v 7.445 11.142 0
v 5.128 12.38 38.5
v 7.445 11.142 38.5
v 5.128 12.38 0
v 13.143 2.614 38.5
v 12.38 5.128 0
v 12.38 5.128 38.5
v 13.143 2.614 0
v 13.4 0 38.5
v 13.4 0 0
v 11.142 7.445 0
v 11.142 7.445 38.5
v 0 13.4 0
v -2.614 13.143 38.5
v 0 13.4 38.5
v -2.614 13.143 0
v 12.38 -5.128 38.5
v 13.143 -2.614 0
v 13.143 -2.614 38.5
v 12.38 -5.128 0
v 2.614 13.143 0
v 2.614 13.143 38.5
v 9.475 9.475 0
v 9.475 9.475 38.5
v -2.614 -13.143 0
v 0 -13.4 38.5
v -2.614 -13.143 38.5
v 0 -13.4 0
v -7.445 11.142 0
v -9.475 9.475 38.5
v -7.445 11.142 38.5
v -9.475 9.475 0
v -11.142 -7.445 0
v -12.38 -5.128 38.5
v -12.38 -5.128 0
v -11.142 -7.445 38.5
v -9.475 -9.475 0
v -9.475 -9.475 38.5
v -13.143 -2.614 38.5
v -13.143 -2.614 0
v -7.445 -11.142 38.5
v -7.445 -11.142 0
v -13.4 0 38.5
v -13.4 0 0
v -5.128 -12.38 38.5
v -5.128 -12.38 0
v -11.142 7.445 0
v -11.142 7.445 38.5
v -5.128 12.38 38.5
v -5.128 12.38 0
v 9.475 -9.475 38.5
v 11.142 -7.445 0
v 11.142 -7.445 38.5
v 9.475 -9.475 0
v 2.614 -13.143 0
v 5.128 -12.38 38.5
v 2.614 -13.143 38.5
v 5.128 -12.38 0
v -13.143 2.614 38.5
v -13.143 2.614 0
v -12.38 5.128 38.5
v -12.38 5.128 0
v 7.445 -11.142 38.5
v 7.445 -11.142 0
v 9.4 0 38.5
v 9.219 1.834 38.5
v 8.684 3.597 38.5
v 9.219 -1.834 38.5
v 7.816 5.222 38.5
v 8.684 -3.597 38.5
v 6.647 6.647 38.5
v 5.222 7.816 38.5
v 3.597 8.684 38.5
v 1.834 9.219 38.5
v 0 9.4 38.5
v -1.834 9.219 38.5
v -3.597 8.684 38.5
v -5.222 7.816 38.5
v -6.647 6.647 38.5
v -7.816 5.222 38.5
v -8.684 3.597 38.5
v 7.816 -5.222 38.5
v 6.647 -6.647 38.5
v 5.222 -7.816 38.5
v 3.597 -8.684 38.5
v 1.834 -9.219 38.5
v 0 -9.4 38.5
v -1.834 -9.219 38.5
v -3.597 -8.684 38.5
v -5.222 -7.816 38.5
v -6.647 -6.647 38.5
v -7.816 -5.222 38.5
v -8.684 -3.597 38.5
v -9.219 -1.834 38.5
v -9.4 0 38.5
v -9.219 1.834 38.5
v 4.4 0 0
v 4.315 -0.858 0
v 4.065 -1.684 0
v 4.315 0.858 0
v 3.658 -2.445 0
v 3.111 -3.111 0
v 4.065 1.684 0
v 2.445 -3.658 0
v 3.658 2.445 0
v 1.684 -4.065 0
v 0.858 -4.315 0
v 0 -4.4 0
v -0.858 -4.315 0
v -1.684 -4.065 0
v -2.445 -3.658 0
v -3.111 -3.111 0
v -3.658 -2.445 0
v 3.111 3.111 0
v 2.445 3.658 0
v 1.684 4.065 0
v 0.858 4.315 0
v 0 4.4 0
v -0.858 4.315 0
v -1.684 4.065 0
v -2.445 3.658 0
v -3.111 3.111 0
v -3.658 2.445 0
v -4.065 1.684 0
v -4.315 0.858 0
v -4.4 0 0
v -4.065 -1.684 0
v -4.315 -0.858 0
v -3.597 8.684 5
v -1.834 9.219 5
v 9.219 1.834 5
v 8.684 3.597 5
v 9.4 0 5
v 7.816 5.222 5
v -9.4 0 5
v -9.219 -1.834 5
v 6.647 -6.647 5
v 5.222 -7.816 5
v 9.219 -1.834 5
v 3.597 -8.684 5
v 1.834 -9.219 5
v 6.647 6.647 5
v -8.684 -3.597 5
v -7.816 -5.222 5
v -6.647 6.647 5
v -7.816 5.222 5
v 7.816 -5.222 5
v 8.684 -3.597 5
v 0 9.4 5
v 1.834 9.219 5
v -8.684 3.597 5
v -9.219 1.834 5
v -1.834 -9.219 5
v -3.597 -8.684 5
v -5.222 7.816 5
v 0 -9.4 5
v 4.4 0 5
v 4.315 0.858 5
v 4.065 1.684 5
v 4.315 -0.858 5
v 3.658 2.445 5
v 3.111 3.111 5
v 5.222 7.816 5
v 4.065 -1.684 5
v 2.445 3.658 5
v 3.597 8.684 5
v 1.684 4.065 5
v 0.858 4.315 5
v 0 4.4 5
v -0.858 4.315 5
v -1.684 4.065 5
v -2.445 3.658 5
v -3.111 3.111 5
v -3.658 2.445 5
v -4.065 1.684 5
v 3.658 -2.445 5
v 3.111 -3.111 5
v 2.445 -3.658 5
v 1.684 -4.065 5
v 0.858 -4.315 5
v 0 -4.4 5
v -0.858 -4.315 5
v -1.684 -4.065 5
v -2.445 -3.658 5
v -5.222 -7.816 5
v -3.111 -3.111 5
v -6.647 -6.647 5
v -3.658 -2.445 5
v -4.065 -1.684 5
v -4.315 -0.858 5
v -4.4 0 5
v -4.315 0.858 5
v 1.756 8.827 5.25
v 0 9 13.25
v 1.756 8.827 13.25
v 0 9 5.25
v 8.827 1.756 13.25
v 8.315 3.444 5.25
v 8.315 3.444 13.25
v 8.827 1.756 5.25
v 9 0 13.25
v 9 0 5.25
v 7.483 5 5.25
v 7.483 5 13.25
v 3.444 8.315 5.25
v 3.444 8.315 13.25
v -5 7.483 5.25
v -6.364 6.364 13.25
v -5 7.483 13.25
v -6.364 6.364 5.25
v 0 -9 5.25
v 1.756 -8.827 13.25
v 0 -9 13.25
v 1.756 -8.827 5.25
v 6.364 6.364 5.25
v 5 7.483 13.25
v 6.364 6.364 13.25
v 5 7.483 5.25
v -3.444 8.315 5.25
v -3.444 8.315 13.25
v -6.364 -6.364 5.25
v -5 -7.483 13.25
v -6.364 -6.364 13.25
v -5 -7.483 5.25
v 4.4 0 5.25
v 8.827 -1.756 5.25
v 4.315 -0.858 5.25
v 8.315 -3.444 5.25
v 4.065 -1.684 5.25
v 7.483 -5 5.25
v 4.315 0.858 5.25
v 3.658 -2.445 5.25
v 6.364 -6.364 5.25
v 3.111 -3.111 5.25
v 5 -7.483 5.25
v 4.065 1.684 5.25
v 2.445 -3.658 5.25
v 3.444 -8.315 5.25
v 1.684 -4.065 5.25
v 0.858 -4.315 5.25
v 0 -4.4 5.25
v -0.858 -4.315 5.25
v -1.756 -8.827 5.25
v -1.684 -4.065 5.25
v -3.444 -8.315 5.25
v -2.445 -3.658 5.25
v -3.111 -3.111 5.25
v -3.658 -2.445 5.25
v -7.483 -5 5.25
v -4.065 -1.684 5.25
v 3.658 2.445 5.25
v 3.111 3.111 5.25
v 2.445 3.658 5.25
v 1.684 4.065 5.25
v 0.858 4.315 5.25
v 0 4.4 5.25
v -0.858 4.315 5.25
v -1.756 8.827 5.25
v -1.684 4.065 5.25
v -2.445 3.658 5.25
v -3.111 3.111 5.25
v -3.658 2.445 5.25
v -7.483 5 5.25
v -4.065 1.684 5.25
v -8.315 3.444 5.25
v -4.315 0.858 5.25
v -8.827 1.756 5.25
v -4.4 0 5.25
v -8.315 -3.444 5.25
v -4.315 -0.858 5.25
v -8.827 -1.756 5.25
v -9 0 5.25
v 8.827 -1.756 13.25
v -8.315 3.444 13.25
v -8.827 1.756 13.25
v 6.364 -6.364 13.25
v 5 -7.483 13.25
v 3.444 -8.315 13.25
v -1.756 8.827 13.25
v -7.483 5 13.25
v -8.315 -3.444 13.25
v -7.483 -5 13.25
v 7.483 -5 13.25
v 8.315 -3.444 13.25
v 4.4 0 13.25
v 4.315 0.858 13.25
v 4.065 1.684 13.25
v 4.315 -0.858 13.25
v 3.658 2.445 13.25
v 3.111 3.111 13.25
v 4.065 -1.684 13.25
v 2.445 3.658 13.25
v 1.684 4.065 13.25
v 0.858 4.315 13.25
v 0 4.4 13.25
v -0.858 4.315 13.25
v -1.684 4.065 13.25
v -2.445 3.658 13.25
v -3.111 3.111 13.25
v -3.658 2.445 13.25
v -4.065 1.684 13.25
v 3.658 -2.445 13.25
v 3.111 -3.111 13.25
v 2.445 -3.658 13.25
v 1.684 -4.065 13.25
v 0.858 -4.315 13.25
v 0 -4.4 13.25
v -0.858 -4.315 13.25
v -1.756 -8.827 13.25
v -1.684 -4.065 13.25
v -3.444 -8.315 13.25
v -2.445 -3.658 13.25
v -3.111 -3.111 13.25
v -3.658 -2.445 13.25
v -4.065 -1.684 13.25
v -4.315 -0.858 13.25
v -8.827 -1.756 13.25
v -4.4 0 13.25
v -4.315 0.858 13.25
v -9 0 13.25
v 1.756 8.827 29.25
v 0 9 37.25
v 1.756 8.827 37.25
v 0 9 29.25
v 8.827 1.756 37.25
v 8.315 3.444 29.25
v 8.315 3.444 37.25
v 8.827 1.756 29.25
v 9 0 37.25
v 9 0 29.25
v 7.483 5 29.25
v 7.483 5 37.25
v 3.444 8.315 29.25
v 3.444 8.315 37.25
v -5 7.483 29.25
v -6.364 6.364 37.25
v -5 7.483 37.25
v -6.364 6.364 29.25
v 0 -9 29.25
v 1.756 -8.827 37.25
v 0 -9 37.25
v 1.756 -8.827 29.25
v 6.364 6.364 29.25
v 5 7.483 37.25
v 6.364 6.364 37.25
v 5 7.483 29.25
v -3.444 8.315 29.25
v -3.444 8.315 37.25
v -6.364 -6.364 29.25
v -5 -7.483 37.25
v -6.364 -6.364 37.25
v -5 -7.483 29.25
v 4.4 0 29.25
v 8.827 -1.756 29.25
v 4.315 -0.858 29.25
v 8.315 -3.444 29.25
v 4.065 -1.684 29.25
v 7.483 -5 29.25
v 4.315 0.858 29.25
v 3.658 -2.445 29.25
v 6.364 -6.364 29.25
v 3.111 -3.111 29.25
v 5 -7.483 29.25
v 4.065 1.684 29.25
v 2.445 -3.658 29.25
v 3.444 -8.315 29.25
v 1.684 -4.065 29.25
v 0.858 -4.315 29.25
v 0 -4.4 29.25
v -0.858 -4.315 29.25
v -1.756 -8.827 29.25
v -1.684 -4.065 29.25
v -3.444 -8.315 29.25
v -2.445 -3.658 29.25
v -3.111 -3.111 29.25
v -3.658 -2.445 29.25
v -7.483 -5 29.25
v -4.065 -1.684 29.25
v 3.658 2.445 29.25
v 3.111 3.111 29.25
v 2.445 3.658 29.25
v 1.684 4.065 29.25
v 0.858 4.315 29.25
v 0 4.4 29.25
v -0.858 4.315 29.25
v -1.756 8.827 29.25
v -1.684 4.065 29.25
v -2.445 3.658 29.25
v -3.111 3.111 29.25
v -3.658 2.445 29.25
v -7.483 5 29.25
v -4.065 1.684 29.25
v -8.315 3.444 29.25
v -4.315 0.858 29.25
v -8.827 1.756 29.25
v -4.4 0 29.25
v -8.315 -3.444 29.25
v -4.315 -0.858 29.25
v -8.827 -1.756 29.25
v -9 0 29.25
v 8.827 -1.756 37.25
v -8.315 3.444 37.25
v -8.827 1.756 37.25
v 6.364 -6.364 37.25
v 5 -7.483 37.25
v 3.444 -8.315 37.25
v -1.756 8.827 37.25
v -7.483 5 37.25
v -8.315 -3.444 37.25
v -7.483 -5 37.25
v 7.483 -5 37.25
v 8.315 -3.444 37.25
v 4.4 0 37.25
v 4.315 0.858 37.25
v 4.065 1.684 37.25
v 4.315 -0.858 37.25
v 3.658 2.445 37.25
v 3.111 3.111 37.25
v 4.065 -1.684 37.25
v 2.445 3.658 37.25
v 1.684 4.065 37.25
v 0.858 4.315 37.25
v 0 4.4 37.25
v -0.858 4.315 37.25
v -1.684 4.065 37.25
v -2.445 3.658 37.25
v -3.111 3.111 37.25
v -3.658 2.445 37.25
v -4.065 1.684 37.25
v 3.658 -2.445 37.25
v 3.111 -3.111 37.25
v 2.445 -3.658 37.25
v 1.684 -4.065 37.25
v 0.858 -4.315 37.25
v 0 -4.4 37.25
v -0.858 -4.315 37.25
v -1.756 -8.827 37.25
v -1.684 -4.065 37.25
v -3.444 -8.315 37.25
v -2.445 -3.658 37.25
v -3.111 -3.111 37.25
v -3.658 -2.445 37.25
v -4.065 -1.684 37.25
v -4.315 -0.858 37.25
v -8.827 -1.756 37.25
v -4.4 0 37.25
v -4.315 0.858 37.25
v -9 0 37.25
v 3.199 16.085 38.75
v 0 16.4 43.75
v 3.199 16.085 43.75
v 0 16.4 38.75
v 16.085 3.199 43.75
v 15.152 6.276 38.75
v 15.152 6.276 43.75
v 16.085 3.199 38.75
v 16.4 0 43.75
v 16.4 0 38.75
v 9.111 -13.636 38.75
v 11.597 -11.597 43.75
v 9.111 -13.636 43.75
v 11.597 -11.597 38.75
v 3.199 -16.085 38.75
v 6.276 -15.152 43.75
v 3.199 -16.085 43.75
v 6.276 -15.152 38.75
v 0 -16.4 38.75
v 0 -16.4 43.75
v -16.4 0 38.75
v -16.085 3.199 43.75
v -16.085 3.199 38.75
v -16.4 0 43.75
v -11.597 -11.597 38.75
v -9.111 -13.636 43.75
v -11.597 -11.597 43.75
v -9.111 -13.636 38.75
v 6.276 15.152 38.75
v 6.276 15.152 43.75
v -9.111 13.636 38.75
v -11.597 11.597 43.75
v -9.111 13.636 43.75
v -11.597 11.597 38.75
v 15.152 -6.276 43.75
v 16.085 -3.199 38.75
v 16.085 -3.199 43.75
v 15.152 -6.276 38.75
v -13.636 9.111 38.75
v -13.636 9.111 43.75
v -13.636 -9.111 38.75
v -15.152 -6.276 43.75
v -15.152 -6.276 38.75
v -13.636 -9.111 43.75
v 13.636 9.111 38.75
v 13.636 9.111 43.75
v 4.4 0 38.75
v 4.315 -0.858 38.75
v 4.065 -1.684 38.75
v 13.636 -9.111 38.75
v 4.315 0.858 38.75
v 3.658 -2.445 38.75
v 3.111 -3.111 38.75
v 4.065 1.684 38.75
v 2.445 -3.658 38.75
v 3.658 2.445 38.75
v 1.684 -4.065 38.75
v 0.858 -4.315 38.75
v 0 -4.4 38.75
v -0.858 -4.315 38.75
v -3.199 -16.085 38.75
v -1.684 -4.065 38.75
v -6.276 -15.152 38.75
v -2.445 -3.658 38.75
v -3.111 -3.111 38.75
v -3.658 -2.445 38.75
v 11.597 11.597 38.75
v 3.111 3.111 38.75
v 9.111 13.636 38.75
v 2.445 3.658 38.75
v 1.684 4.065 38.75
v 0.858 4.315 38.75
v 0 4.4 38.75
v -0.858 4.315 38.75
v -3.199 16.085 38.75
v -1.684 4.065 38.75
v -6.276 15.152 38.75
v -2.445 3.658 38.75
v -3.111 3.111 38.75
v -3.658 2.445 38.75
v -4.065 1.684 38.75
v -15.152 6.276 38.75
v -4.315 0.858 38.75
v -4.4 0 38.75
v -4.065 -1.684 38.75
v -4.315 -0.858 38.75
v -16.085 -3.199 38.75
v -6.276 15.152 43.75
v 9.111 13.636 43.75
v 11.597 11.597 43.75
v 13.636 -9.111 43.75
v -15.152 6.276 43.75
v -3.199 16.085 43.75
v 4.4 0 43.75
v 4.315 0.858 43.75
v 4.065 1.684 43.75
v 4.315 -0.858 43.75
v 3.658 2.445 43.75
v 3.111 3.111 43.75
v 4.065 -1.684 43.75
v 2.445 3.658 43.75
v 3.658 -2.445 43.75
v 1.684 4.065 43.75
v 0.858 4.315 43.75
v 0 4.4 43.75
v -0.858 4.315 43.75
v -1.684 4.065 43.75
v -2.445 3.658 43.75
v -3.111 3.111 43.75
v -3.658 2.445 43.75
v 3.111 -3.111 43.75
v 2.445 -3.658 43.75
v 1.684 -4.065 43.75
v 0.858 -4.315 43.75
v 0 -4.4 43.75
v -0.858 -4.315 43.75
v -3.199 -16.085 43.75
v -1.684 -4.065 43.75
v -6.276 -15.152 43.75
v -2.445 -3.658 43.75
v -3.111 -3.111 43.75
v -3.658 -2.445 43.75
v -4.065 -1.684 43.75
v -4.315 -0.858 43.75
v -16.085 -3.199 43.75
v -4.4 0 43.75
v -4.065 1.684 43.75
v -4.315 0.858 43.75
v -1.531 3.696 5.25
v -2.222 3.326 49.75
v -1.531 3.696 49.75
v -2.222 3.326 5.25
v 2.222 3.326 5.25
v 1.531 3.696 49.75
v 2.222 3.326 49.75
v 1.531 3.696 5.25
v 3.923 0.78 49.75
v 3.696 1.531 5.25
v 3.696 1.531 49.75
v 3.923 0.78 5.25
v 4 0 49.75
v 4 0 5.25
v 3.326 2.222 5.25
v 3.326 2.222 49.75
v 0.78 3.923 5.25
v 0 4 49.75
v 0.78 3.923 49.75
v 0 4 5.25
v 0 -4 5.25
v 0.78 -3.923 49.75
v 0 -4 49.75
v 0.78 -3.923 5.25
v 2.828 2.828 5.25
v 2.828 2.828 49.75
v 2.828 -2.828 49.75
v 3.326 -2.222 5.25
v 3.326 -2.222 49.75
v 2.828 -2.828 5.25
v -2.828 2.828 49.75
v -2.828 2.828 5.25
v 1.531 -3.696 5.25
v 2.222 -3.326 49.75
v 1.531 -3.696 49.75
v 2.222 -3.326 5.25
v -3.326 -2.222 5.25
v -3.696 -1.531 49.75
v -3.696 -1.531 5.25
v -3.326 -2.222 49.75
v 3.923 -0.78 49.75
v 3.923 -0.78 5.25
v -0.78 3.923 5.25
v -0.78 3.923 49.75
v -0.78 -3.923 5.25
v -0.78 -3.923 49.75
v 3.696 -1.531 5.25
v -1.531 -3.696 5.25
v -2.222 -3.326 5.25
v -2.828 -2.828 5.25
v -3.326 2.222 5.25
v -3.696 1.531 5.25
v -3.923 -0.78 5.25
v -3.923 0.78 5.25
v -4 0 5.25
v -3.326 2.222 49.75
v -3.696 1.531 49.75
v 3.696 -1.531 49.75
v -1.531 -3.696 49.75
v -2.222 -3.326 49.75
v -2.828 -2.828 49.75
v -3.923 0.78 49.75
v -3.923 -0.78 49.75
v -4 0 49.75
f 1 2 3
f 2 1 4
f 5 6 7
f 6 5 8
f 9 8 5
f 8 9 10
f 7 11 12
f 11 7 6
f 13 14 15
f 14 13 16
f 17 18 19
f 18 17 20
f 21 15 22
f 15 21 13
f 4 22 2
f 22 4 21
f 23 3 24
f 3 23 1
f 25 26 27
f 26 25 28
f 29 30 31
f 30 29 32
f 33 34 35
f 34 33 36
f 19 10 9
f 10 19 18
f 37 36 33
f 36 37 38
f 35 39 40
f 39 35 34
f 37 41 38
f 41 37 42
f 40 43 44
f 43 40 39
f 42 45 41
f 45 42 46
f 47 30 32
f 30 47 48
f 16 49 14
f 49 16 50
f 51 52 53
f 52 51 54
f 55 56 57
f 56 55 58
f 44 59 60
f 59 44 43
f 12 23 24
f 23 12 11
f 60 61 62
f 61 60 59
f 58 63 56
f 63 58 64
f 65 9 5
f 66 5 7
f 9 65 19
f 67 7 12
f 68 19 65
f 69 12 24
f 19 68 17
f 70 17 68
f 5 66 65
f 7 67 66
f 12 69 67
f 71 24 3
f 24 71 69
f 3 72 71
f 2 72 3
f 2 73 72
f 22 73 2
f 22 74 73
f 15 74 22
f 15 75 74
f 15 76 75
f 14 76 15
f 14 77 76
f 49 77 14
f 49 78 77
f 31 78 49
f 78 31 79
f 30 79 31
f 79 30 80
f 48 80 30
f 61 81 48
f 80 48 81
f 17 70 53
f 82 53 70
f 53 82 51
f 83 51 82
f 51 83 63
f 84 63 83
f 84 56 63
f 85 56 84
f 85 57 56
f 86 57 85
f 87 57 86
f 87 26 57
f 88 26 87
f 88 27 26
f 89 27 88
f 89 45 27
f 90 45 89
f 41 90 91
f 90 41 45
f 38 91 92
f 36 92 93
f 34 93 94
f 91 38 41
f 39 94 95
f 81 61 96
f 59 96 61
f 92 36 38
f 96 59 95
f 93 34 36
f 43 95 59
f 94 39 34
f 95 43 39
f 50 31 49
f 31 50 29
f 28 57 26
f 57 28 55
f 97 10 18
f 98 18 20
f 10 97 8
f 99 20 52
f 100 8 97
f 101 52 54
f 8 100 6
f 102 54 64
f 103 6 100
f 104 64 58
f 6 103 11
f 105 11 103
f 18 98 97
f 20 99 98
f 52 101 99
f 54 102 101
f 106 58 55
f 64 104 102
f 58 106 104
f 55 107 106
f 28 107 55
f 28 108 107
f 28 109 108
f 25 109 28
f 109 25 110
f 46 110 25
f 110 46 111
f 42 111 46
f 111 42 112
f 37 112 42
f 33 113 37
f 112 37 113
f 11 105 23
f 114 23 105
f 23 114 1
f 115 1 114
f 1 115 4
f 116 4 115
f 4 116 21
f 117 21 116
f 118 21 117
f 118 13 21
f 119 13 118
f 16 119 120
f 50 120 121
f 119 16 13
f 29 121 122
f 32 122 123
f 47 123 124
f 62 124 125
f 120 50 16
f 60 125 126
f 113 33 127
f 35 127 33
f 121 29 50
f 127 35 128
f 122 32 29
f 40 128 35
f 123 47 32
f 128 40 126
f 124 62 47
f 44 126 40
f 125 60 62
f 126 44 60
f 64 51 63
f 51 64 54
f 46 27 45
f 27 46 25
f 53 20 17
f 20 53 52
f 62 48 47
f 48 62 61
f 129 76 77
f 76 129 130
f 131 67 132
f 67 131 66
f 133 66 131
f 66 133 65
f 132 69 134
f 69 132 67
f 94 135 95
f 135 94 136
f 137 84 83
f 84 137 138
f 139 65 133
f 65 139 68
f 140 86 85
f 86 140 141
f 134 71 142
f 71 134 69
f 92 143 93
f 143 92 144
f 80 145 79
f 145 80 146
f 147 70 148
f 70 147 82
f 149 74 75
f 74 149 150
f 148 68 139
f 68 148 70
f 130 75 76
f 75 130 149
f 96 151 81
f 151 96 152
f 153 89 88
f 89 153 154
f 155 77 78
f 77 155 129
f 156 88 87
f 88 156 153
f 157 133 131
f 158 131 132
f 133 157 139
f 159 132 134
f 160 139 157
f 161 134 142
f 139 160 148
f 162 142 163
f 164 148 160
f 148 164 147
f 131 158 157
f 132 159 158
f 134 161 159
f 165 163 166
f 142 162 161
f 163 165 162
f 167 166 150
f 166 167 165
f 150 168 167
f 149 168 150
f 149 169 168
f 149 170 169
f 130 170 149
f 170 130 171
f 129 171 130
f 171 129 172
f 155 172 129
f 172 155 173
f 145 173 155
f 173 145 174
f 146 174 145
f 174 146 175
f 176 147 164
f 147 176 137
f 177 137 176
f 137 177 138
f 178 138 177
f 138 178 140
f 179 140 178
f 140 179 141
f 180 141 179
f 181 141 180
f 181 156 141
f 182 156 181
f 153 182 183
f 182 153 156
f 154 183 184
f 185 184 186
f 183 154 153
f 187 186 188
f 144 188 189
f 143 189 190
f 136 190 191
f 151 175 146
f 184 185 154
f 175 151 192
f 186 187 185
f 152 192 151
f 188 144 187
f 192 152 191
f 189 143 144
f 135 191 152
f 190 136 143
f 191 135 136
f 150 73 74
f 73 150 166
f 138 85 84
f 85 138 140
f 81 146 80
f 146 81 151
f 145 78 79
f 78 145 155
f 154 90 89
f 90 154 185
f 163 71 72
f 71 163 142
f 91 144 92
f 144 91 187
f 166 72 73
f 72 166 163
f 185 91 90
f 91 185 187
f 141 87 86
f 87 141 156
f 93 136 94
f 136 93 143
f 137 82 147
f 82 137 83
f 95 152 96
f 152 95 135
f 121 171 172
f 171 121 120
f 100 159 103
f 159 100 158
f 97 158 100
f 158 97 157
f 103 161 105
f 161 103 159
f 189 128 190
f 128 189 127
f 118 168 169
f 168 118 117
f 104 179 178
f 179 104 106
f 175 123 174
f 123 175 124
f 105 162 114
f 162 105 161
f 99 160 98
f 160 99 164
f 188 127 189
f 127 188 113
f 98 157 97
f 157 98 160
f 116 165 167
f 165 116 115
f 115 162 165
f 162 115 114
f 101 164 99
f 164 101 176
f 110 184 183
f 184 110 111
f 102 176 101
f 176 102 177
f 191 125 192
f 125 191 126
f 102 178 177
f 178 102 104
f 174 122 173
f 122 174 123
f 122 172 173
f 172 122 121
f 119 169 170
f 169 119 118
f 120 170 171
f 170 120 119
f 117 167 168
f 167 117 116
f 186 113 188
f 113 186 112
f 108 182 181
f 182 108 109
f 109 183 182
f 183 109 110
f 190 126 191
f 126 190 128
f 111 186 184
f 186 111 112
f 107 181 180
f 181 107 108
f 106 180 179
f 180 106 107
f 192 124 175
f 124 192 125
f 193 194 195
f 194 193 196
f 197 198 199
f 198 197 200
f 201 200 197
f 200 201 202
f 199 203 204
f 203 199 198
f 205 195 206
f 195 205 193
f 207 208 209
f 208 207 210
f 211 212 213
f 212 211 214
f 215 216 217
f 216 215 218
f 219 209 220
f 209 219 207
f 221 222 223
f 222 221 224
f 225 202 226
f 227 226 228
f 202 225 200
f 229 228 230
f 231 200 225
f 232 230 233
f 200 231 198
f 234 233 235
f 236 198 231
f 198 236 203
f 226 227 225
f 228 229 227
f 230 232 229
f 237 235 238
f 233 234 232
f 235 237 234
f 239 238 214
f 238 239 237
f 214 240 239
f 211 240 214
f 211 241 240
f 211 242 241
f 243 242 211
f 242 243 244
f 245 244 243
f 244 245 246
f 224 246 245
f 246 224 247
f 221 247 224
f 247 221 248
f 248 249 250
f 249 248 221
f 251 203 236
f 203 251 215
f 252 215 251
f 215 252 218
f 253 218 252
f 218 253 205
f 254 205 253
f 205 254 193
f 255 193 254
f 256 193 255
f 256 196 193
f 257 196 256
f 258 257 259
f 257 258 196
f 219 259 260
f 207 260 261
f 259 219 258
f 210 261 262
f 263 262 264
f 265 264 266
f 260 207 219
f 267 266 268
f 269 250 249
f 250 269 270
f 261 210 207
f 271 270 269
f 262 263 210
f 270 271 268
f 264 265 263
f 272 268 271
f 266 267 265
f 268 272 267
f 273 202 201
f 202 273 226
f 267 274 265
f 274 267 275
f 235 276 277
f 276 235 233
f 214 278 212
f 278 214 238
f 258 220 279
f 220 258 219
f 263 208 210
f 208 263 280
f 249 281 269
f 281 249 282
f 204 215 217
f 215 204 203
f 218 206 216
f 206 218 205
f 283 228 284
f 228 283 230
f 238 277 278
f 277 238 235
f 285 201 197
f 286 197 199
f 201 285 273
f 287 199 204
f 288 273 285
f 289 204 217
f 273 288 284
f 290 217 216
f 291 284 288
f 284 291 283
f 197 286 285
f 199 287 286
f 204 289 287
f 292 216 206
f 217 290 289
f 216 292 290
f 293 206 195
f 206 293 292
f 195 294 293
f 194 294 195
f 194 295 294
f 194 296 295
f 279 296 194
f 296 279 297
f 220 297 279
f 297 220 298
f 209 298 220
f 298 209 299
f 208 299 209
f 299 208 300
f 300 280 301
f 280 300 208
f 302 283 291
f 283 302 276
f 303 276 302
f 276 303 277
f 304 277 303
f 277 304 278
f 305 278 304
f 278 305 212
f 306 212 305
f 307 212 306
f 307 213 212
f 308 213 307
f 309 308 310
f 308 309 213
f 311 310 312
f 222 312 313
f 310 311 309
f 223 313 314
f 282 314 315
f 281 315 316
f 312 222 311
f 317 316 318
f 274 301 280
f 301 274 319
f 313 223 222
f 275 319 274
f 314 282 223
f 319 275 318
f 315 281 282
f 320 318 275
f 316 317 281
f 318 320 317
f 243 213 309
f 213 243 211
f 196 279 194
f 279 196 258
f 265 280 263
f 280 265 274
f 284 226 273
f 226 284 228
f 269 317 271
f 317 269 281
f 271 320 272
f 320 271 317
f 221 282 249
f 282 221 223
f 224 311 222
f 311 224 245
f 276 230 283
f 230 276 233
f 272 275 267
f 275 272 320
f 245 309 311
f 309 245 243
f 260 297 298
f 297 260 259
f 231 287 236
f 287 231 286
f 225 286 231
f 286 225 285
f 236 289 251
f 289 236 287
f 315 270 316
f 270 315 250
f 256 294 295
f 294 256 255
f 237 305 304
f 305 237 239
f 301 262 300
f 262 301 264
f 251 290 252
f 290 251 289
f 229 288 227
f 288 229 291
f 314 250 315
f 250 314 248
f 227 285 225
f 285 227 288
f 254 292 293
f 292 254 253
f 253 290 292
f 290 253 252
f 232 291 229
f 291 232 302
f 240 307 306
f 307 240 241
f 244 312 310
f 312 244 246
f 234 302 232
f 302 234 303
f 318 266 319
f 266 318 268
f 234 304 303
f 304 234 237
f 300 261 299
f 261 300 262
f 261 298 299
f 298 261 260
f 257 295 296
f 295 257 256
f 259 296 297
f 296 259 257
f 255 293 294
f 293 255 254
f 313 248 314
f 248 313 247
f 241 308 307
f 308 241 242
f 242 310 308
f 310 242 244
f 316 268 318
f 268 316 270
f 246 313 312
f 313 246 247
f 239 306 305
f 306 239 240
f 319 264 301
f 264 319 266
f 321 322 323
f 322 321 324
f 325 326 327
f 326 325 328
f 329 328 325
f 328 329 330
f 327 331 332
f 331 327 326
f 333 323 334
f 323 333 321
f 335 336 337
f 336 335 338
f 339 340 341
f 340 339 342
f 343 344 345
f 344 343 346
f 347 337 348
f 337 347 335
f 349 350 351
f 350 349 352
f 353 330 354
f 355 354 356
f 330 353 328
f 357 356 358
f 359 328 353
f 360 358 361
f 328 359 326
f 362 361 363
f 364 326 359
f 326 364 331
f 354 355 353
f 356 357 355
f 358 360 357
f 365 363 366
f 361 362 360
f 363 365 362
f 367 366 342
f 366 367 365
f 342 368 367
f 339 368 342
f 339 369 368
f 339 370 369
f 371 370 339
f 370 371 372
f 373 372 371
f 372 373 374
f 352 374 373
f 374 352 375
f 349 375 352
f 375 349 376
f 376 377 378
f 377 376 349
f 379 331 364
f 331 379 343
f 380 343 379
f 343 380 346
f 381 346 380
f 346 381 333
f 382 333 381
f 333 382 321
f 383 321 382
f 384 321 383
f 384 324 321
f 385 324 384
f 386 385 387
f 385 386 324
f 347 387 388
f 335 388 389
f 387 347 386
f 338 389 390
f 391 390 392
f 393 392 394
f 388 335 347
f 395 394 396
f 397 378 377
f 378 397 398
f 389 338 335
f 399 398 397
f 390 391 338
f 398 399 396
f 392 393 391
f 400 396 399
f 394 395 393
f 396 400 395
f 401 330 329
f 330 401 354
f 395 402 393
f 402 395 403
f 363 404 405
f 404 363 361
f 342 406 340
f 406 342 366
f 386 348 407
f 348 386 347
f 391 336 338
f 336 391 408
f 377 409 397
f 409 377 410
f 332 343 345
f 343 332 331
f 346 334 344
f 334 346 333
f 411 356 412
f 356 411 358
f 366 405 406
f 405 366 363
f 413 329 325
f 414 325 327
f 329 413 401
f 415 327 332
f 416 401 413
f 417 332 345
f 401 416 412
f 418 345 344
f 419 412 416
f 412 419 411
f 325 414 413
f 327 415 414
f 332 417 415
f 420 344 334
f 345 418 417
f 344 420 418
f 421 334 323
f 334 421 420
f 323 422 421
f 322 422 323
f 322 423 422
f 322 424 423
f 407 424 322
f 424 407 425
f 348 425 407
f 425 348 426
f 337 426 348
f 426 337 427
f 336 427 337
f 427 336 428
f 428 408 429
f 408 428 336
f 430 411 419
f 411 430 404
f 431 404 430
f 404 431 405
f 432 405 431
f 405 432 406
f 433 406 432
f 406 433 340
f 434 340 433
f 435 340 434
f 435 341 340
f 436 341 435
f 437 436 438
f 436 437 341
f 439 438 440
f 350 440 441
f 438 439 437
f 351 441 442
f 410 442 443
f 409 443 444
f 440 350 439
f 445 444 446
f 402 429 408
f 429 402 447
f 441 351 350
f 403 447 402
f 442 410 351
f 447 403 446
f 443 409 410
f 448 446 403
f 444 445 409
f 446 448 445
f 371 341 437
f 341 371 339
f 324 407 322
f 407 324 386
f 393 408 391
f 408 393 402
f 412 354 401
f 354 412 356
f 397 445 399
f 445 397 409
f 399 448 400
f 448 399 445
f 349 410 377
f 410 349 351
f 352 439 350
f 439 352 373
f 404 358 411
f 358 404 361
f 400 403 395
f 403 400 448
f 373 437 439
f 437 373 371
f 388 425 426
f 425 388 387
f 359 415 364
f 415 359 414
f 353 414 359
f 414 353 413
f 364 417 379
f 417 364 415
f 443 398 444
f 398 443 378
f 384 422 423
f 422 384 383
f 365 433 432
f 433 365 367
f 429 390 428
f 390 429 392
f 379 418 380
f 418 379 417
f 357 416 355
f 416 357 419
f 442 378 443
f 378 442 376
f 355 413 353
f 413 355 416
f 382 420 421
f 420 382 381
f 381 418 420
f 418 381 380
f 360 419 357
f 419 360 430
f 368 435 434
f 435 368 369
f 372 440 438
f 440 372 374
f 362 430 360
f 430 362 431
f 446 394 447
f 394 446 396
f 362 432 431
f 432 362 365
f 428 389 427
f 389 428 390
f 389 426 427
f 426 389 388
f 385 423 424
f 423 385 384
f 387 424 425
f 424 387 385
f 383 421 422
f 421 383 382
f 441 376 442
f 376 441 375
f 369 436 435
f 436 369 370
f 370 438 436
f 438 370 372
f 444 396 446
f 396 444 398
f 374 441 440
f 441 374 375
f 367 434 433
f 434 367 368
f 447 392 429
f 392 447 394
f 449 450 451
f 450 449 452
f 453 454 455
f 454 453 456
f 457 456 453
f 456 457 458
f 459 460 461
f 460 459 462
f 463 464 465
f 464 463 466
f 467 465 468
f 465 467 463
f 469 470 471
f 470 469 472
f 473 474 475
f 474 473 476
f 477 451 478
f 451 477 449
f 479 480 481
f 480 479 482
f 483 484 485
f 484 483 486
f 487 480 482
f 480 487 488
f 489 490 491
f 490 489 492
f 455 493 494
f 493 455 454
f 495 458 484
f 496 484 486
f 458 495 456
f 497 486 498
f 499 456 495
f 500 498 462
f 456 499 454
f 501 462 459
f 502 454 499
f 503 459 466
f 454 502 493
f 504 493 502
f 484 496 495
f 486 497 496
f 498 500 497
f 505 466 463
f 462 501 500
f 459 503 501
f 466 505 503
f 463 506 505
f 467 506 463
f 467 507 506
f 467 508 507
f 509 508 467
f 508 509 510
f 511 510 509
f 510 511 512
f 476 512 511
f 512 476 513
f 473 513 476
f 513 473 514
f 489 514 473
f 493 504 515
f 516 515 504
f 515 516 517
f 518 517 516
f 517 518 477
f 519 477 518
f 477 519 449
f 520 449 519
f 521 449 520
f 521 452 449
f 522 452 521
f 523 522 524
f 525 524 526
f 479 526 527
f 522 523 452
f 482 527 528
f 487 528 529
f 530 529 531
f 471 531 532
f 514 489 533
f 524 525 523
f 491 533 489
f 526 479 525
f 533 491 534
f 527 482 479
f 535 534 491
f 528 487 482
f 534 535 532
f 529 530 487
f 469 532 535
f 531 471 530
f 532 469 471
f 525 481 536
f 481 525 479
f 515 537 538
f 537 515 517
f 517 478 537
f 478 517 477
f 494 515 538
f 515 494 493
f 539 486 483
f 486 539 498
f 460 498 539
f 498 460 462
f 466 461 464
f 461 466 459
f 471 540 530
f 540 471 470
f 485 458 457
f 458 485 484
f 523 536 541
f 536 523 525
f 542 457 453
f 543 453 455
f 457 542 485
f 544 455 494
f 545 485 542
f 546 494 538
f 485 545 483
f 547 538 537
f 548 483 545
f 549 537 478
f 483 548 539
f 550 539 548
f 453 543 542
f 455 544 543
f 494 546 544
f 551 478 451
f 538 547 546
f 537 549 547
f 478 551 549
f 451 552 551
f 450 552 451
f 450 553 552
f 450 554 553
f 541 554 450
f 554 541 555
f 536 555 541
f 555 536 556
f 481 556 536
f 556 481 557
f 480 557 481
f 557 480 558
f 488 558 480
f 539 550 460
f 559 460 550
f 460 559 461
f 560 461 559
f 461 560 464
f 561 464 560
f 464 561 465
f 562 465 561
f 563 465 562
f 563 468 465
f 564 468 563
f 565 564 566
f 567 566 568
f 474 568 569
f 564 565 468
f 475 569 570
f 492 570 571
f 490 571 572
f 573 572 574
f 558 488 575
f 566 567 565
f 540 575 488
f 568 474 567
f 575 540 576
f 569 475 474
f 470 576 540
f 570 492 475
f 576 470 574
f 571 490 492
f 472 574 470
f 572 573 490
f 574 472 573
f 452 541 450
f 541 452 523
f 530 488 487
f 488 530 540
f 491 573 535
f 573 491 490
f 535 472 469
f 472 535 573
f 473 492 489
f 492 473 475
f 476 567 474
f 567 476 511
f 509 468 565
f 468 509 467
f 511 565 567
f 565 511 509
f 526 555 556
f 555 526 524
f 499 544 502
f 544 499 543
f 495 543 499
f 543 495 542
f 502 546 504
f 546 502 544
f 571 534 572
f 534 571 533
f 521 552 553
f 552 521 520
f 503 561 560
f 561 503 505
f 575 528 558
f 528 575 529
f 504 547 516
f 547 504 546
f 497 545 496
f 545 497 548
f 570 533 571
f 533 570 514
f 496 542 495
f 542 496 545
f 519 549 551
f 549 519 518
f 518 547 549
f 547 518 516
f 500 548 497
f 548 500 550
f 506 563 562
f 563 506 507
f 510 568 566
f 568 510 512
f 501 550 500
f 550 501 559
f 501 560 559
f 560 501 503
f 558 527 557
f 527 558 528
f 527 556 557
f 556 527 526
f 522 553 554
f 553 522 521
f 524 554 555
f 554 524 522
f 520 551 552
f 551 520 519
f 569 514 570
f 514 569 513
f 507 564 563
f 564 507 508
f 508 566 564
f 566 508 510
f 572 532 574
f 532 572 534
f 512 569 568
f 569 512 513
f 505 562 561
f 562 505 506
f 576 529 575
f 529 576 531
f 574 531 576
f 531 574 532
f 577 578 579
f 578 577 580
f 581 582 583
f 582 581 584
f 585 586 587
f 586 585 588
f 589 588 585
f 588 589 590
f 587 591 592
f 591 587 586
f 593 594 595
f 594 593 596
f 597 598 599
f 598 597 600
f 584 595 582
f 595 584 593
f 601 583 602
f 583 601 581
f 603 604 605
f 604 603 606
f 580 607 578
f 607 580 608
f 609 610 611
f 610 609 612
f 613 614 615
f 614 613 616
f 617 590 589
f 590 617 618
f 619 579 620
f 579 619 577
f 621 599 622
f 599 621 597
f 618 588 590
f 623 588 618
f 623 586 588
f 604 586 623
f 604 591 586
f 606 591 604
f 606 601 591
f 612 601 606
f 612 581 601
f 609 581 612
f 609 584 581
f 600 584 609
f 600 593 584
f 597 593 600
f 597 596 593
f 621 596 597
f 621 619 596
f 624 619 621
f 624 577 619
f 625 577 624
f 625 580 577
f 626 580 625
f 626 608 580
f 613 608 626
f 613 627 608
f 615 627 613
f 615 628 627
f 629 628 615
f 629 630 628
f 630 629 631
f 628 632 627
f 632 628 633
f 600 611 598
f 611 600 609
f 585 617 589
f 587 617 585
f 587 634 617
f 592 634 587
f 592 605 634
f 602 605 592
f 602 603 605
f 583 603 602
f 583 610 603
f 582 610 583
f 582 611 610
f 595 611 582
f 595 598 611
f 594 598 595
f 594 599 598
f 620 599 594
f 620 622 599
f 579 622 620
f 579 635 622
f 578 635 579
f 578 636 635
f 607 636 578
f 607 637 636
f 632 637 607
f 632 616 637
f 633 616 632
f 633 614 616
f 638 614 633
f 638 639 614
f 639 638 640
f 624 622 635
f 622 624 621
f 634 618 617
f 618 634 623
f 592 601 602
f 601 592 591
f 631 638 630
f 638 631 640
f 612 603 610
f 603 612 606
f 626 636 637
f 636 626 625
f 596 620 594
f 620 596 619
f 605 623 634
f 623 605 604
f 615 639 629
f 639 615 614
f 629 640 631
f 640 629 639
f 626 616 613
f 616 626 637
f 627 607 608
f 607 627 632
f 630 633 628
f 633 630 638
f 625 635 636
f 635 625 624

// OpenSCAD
$fn = 32;

// ------------------------------------------------------------------------
// Shaft station: cup d26.8 x 38.5 mm, shaft d8
// Every part is its own module, assembly() places every instance.
// ------------------------------------------------------------------------

// --- part 1 ---
module housing_cup() {
  difference() {
    cylinder(h = 38.5, d = 26.8);
    translate([0, 0, 5]) cylinder(h = 34.5, d = 18.8);
    translate([0, 0, -1]) cylinder(h = 7, d = 8.8);
  }
}

// --- part 2 ---
module bearing_lower() {
  difference() {
      translate([0, 0, 0]) cylinder(h = 8, d = 18);
      translate([0, 0, -1]) cylinder(h = 10, d = 8.8);
    }
}

// --- part 3 ---
module bearing_upper() {
  difference() {
      translate([0, 0, 0]) cylinder(h = 8, d = 18);
      translate([0, 0, -1]) cylinder(h = 10, d = 8.8);
    }
}

// --- part 4 ---
module station_shaft() {
  translate([0, 0, -22.25]) cylinder(h = 44.5, d = 8);
}

// --- part 5 ---
module station_cover() {
  difference() {
    cylinder(h = 5, d = 32.8);
    translate([0, 0, -1]) cylinder(h = 7, d = 8.8);
  }
}

// --- assembly ---
module assembly() {
  color([0.80, 0.24, 0.20]) translate([0, 0, 0]) rotate([0, 0, 0]) housing_cup();
  color([0.20, 0.45, 0.75]) translate([0, 0, 5.25]) rotate([0, 0, 0]) bearing_lower();
  color([0.25, 0.62, 0.32]) translate([0, 0, 29.25]) rotate([0, 0, 0]) bearing_upper();
  color([0.92, 0.70, 0.18]) translate([0, 0, 27.5]) rotate([0, 0, 0]) station_shaft();
  color([0.58, 0.35, 0.70]) translate([0, 0, 38.75]) rotate([0, 0, 0]) station_cover();
}

assembly();
